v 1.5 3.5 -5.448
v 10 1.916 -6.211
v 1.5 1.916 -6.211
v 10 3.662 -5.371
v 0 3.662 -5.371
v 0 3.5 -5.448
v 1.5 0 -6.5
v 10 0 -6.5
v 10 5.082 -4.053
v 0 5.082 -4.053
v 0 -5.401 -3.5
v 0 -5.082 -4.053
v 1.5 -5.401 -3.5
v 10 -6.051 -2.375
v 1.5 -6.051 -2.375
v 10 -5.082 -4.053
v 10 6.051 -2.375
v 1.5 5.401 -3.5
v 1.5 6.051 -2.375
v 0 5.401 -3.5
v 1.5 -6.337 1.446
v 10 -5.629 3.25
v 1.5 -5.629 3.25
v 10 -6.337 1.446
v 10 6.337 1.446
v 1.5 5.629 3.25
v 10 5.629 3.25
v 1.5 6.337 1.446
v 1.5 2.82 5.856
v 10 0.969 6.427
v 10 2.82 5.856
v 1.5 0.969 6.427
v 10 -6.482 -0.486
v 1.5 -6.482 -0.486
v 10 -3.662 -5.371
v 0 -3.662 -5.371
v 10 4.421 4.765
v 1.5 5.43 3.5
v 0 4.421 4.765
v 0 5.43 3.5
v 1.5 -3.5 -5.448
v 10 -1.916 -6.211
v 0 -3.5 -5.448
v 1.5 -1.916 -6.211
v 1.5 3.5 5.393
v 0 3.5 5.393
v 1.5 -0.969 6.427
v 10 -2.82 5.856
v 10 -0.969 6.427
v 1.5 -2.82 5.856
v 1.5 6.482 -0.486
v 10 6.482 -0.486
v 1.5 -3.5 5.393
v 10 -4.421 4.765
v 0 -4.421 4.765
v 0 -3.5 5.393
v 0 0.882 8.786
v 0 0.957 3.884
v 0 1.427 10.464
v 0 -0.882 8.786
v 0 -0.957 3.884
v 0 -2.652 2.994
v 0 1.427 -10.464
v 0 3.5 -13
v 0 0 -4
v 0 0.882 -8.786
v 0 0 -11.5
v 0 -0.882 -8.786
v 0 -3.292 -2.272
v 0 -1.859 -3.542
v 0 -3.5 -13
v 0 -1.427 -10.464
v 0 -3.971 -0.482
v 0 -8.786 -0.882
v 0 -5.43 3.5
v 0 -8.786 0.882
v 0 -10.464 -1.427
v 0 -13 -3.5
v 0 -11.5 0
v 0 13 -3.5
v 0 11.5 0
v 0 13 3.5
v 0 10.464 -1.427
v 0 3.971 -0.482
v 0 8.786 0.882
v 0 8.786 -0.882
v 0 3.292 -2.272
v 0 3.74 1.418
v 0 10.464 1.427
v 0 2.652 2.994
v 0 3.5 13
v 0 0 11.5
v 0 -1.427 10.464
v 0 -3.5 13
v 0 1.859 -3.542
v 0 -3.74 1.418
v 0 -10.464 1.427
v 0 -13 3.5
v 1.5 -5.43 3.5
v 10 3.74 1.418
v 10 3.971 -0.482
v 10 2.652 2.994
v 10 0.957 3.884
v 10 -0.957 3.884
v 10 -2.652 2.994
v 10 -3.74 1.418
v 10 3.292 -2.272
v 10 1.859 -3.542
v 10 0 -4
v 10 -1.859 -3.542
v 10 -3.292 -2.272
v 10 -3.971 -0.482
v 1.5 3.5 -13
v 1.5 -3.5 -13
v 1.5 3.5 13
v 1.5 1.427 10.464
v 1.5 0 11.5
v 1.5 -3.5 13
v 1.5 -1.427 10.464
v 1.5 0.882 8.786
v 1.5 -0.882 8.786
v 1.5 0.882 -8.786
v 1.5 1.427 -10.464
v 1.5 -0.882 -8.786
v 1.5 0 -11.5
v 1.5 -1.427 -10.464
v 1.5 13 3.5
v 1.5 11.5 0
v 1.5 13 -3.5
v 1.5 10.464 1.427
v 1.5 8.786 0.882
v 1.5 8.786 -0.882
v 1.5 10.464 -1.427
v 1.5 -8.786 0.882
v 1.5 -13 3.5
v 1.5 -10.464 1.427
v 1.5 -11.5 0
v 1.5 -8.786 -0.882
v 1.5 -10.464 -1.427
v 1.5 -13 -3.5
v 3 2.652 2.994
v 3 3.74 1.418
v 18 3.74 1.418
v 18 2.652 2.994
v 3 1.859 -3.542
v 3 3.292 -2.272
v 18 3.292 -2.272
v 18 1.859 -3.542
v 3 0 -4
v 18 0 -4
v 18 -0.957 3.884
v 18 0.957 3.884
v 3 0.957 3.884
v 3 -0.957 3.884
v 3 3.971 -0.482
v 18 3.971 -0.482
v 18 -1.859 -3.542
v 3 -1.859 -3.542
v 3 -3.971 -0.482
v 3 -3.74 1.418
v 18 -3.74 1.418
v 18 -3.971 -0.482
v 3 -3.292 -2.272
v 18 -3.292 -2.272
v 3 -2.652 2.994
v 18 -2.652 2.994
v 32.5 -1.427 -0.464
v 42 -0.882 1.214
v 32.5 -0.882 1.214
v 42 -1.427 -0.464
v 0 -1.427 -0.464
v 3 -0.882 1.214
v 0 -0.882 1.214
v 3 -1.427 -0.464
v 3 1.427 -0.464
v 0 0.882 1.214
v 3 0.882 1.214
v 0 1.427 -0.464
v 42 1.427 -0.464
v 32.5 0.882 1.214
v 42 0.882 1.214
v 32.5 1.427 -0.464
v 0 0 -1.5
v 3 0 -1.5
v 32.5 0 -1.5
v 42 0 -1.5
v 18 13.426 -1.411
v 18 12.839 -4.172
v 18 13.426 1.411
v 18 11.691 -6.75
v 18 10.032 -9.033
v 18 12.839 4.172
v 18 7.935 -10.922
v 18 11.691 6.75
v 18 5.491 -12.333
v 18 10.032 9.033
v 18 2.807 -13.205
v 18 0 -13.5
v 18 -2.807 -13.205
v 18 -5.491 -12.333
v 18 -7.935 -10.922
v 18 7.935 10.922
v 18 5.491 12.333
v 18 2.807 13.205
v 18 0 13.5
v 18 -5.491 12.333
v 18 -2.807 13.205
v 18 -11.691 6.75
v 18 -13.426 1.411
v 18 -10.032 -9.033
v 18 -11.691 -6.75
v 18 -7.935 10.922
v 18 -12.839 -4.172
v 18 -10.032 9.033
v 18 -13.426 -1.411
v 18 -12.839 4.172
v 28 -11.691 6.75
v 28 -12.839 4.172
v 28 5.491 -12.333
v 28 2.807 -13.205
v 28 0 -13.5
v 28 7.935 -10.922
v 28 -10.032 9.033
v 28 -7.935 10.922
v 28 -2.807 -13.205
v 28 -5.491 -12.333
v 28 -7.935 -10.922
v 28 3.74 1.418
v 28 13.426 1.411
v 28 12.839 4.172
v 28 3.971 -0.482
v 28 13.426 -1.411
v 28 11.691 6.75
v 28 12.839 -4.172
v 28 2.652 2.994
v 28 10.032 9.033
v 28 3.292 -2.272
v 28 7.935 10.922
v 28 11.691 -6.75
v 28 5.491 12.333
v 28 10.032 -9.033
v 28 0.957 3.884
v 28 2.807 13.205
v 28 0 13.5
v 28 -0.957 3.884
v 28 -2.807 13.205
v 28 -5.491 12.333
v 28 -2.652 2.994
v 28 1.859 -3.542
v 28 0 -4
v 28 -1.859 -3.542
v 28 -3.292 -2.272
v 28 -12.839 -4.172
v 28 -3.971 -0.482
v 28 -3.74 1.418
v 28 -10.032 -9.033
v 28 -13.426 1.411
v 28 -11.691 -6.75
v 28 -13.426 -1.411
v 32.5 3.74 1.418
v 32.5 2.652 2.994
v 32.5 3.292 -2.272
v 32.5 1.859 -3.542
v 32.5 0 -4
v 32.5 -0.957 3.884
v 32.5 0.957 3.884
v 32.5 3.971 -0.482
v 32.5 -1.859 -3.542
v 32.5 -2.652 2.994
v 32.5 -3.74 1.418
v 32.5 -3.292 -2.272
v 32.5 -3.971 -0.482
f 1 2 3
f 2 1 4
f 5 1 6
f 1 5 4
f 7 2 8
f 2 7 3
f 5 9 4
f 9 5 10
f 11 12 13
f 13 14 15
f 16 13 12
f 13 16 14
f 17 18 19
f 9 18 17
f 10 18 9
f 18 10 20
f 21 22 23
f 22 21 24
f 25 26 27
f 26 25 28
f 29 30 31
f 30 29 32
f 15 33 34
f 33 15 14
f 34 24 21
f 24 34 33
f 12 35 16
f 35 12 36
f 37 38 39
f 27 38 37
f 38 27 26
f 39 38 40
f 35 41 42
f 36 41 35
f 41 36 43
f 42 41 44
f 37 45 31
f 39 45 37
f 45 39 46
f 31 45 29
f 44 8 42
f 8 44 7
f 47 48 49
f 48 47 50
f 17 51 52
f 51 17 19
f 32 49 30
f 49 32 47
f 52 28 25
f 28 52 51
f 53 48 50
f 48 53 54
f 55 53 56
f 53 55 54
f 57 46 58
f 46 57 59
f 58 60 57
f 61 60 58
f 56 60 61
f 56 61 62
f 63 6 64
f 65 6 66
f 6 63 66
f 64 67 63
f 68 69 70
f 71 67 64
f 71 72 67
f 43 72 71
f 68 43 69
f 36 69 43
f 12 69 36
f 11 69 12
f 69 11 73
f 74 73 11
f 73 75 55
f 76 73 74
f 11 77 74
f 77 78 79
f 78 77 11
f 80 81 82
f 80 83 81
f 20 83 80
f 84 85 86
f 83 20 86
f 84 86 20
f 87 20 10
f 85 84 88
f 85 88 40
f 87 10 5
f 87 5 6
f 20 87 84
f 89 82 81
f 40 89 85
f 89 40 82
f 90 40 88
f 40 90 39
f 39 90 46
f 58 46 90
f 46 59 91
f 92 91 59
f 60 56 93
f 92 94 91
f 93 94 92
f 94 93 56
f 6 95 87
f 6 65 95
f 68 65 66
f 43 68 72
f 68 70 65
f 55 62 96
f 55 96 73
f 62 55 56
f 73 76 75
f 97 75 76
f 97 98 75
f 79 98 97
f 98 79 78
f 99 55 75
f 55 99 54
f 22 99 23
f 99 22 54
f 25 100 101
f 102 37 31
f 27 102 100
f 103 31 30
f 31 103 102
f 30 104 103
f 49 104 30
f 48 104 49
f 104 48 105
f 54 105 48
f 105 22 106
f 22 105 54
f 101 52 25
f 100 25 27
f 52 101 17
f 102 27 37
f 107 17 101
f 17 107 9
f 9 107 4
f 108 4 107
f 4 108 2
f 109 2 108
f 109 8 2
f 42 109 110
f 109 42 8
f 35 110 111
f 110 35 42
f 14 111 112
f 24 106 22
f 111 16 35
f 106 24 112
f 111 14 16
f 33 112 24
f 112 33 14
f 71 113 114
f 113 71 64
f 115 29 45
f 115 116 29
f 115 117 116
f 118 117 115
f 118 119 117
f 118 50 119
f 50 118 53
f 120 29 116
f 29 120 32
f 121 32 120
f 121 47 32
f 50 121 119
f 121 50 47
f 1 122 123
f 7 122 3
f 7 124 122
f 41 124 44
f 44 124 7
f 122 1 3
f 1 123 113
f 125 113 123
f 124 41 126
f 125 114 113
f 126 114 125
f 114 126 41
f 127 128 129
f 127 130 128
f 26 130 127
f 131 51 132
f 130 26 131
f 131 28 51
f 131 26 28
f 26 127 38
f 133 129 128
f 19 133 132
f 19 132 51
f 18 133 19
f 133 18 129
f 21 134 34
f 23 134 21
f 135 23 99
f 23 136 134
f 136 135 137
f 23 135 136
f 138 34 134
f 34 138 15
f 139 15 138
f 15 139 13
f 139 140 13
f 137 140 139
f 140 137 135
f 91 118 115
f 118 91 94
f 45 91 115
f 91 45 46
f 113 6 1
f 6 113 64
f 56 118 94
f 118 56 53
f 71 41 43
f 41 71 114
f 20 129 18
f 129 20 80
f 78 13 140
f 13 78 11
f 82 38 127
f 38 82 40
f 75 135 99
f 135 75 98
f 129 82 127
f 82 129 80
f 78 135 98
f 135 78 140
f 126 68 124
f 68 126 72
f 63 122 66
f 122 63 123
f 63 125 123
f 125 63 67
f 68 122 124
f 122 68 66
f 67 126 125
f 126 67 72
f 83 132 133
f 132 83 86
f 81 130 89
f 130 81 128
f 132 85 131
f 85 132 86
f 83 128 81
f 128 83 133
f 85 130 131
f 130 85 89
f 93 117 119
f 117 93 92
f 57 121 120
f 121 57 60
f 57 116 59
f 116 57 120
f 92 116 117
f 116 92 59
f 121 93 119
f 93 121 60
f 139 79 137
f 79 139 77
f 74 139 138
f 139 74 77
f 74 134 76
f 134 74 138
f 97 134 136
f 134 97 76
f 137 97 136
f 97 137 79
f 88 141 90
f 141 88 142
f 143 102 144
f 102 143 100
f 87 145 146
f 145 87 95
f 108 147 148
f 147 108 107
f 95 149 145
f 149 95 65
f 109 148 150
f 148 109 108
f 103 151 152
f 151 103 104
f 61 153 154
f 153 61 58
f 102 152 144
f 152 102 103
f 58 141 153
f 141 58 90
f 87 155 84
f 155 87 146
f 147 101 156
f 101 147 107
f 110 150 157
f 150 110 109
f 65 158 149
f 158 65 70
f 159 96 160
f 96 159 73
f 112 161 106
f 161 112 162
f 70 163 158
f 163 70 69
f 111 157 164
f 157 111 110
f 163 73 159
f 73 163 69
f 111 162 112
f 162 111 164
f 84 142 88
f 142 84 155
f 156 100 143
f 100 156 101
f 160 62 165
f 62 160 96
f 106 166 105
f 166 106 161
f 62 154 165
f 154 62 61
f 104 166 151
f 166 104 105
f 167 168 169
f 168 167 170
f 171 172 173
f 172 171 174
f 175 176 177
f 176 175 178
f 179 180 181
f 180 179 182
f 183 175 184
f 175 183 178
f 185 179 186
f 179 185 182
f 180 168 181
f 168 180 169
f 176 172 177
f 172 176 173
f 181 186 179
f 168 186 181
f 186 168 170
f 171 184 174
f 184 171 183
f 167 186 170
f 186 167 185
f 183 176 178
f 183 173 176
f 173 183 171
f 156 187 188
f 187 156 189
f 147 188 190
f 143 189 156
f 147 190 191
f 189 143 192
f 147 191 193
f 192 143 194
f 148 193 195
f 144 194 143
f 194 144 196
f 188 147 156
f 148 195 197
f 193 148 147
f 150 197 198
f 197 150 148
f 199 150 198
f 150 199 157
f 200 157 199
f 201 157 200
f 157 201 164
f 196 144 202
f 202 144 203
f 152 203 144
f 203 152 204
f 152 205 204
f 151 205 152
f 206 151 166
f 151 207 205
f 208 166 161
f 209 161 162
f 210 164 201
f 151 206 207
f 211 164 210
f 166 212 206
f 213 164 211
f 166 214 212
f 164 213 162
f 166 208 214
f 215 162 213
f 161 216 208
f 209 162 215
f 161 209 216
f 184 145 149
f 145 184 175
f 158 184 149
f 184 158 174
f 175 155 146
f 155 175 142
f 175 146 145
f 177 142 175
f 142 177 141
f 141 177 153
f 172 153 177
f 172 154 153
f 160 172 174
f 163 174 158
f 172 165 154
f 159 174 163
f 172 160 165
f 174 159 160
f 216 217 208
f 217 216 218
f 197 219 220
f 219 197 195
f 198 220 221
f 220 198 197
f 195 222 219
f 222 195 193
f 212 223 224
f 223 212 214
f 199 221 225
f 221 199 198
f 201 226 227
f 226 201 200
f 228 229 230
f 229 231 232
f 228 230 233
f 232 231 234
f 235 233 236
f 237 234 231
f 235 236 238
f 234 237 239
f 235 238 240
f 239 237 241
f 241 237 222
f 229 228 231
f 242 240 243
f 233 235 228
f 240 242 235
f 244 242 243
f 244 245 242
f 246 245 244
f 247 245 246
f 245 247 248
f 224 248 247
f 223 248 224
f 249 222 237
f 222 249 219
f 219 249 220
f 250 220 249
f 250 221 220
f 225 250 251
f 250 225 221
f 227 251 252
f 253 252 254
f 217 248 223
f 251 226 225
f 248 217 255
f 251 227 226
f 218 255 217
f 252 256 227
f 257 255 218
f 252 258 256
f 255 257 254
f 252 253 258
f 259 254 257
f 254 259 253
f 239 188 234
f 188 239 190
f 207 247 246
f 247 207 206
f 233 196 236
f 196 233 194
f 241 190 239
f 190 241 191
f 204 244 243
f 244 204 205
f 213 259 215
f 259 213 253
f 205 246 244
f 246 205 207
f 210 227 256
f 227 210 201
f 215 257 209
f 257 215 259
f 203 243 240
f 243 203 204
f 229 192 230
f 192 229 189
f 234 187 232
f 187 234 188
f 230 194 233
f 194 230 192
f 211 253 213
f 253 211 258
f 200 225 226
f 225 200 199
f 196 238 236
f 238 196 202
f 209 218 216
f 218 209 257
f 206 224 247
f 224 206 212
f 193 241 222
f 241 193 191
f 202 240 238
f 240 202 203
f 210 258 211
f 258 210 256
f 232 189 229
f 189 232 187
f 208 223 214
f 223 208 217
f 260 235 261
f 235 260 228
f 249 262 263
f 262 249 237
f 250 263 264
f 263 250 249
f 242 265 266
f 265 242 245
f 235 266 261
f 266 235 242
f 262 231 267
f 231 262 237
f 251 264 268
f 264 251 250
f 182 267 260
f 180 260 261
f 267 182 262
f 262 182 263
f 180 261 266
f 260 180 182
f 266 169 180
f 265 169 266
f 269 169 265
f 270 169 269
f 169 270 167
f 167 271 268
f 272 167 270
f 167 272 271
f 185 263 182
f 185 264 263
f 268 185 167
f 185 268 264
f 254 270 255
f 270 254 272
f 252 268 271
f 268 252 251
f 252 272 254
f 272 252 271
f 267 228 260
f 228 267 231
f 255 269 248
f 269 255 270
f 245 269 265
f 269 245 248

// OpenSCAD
/*
    Motor mounts for the OpenSCAD aeroplane

    Copyright (C) Tim Molteno, tim@molteno.net

    
    This program is free software: you can redistribute it and/or modify
    it under the terms of the GNU General Public License as published by
    the Free Software Foundation, either version 3 of the License, or
    (at your option) any later version.

    This program is distributed in the hope that it will be useful,
    but WITHOUT ANY WARRANTY; without even the implied warranty of
    MERCHANTABILITY or FITNESS FOR A PARTICULAR PURPOSE.  See the
    GNU General Public License for more details.

    You should have received a copy of the GNU General Public License
    along with this program.  If not, see <http://www.gnu.org/licenses/>.
*/

module motor_mount() {
  difference() {
    union() {
      cylinder(r=6.5, h=10);
      translate([0,0,0.75]) cube([26,7 ,1.5], center=true);
      translate([0,0,0.75]) cube([7, 26,1.5], center=true);
    }
    cylinder(r=4, h=12, center=true);
    for (angle = [0,90,180,270]) {
      rotate(angle) translate([10,0,0]) cylinder(r=1.5, h=5, center=true);
    }
  }
}

/* Turnigy 2730-1500 */
module motor() {
  rotate([0,90,0]) {
    motor_mount();
    color("silver") cylinder(r=1.5, h=42); // shaft
    color("gold") translate([0,0,3]) cylinder(r=4, h=15); // housing
    color("red") translate([0,0,18]) cylinder(r=13.5, h=10); // outrunner
    translate([0,0,28]) cylinder(r=4, h=4.5); // forward housing
  }
}


/* Turnigy nano-tech 300mAH 2S 35-70C */
module battery() {
  cube([46, 18,12.5], center=true);
}


/* Servo. Turnigy TG9e */

module servo() {
  translate([-6, -11.5,0]) cube([12, 23, 23]);
  translate([-6,-16.25,16.5]) cube([12, 32.5, 2]);
  translate([0,0,23]) cylinder(r=6, h=4);
  translate([0,0,27]) cylinder(r=2.5, h=2.5);
}

module servo_arm() {
  cylinder(r=3.5, h=4);
  translate([0,0,2.5]) hull() {
    cylinder(r=3.5, h=1.5);
    translate([14,0,0]) cylinder(r=2, h=1.5);
  }
}

motor();
